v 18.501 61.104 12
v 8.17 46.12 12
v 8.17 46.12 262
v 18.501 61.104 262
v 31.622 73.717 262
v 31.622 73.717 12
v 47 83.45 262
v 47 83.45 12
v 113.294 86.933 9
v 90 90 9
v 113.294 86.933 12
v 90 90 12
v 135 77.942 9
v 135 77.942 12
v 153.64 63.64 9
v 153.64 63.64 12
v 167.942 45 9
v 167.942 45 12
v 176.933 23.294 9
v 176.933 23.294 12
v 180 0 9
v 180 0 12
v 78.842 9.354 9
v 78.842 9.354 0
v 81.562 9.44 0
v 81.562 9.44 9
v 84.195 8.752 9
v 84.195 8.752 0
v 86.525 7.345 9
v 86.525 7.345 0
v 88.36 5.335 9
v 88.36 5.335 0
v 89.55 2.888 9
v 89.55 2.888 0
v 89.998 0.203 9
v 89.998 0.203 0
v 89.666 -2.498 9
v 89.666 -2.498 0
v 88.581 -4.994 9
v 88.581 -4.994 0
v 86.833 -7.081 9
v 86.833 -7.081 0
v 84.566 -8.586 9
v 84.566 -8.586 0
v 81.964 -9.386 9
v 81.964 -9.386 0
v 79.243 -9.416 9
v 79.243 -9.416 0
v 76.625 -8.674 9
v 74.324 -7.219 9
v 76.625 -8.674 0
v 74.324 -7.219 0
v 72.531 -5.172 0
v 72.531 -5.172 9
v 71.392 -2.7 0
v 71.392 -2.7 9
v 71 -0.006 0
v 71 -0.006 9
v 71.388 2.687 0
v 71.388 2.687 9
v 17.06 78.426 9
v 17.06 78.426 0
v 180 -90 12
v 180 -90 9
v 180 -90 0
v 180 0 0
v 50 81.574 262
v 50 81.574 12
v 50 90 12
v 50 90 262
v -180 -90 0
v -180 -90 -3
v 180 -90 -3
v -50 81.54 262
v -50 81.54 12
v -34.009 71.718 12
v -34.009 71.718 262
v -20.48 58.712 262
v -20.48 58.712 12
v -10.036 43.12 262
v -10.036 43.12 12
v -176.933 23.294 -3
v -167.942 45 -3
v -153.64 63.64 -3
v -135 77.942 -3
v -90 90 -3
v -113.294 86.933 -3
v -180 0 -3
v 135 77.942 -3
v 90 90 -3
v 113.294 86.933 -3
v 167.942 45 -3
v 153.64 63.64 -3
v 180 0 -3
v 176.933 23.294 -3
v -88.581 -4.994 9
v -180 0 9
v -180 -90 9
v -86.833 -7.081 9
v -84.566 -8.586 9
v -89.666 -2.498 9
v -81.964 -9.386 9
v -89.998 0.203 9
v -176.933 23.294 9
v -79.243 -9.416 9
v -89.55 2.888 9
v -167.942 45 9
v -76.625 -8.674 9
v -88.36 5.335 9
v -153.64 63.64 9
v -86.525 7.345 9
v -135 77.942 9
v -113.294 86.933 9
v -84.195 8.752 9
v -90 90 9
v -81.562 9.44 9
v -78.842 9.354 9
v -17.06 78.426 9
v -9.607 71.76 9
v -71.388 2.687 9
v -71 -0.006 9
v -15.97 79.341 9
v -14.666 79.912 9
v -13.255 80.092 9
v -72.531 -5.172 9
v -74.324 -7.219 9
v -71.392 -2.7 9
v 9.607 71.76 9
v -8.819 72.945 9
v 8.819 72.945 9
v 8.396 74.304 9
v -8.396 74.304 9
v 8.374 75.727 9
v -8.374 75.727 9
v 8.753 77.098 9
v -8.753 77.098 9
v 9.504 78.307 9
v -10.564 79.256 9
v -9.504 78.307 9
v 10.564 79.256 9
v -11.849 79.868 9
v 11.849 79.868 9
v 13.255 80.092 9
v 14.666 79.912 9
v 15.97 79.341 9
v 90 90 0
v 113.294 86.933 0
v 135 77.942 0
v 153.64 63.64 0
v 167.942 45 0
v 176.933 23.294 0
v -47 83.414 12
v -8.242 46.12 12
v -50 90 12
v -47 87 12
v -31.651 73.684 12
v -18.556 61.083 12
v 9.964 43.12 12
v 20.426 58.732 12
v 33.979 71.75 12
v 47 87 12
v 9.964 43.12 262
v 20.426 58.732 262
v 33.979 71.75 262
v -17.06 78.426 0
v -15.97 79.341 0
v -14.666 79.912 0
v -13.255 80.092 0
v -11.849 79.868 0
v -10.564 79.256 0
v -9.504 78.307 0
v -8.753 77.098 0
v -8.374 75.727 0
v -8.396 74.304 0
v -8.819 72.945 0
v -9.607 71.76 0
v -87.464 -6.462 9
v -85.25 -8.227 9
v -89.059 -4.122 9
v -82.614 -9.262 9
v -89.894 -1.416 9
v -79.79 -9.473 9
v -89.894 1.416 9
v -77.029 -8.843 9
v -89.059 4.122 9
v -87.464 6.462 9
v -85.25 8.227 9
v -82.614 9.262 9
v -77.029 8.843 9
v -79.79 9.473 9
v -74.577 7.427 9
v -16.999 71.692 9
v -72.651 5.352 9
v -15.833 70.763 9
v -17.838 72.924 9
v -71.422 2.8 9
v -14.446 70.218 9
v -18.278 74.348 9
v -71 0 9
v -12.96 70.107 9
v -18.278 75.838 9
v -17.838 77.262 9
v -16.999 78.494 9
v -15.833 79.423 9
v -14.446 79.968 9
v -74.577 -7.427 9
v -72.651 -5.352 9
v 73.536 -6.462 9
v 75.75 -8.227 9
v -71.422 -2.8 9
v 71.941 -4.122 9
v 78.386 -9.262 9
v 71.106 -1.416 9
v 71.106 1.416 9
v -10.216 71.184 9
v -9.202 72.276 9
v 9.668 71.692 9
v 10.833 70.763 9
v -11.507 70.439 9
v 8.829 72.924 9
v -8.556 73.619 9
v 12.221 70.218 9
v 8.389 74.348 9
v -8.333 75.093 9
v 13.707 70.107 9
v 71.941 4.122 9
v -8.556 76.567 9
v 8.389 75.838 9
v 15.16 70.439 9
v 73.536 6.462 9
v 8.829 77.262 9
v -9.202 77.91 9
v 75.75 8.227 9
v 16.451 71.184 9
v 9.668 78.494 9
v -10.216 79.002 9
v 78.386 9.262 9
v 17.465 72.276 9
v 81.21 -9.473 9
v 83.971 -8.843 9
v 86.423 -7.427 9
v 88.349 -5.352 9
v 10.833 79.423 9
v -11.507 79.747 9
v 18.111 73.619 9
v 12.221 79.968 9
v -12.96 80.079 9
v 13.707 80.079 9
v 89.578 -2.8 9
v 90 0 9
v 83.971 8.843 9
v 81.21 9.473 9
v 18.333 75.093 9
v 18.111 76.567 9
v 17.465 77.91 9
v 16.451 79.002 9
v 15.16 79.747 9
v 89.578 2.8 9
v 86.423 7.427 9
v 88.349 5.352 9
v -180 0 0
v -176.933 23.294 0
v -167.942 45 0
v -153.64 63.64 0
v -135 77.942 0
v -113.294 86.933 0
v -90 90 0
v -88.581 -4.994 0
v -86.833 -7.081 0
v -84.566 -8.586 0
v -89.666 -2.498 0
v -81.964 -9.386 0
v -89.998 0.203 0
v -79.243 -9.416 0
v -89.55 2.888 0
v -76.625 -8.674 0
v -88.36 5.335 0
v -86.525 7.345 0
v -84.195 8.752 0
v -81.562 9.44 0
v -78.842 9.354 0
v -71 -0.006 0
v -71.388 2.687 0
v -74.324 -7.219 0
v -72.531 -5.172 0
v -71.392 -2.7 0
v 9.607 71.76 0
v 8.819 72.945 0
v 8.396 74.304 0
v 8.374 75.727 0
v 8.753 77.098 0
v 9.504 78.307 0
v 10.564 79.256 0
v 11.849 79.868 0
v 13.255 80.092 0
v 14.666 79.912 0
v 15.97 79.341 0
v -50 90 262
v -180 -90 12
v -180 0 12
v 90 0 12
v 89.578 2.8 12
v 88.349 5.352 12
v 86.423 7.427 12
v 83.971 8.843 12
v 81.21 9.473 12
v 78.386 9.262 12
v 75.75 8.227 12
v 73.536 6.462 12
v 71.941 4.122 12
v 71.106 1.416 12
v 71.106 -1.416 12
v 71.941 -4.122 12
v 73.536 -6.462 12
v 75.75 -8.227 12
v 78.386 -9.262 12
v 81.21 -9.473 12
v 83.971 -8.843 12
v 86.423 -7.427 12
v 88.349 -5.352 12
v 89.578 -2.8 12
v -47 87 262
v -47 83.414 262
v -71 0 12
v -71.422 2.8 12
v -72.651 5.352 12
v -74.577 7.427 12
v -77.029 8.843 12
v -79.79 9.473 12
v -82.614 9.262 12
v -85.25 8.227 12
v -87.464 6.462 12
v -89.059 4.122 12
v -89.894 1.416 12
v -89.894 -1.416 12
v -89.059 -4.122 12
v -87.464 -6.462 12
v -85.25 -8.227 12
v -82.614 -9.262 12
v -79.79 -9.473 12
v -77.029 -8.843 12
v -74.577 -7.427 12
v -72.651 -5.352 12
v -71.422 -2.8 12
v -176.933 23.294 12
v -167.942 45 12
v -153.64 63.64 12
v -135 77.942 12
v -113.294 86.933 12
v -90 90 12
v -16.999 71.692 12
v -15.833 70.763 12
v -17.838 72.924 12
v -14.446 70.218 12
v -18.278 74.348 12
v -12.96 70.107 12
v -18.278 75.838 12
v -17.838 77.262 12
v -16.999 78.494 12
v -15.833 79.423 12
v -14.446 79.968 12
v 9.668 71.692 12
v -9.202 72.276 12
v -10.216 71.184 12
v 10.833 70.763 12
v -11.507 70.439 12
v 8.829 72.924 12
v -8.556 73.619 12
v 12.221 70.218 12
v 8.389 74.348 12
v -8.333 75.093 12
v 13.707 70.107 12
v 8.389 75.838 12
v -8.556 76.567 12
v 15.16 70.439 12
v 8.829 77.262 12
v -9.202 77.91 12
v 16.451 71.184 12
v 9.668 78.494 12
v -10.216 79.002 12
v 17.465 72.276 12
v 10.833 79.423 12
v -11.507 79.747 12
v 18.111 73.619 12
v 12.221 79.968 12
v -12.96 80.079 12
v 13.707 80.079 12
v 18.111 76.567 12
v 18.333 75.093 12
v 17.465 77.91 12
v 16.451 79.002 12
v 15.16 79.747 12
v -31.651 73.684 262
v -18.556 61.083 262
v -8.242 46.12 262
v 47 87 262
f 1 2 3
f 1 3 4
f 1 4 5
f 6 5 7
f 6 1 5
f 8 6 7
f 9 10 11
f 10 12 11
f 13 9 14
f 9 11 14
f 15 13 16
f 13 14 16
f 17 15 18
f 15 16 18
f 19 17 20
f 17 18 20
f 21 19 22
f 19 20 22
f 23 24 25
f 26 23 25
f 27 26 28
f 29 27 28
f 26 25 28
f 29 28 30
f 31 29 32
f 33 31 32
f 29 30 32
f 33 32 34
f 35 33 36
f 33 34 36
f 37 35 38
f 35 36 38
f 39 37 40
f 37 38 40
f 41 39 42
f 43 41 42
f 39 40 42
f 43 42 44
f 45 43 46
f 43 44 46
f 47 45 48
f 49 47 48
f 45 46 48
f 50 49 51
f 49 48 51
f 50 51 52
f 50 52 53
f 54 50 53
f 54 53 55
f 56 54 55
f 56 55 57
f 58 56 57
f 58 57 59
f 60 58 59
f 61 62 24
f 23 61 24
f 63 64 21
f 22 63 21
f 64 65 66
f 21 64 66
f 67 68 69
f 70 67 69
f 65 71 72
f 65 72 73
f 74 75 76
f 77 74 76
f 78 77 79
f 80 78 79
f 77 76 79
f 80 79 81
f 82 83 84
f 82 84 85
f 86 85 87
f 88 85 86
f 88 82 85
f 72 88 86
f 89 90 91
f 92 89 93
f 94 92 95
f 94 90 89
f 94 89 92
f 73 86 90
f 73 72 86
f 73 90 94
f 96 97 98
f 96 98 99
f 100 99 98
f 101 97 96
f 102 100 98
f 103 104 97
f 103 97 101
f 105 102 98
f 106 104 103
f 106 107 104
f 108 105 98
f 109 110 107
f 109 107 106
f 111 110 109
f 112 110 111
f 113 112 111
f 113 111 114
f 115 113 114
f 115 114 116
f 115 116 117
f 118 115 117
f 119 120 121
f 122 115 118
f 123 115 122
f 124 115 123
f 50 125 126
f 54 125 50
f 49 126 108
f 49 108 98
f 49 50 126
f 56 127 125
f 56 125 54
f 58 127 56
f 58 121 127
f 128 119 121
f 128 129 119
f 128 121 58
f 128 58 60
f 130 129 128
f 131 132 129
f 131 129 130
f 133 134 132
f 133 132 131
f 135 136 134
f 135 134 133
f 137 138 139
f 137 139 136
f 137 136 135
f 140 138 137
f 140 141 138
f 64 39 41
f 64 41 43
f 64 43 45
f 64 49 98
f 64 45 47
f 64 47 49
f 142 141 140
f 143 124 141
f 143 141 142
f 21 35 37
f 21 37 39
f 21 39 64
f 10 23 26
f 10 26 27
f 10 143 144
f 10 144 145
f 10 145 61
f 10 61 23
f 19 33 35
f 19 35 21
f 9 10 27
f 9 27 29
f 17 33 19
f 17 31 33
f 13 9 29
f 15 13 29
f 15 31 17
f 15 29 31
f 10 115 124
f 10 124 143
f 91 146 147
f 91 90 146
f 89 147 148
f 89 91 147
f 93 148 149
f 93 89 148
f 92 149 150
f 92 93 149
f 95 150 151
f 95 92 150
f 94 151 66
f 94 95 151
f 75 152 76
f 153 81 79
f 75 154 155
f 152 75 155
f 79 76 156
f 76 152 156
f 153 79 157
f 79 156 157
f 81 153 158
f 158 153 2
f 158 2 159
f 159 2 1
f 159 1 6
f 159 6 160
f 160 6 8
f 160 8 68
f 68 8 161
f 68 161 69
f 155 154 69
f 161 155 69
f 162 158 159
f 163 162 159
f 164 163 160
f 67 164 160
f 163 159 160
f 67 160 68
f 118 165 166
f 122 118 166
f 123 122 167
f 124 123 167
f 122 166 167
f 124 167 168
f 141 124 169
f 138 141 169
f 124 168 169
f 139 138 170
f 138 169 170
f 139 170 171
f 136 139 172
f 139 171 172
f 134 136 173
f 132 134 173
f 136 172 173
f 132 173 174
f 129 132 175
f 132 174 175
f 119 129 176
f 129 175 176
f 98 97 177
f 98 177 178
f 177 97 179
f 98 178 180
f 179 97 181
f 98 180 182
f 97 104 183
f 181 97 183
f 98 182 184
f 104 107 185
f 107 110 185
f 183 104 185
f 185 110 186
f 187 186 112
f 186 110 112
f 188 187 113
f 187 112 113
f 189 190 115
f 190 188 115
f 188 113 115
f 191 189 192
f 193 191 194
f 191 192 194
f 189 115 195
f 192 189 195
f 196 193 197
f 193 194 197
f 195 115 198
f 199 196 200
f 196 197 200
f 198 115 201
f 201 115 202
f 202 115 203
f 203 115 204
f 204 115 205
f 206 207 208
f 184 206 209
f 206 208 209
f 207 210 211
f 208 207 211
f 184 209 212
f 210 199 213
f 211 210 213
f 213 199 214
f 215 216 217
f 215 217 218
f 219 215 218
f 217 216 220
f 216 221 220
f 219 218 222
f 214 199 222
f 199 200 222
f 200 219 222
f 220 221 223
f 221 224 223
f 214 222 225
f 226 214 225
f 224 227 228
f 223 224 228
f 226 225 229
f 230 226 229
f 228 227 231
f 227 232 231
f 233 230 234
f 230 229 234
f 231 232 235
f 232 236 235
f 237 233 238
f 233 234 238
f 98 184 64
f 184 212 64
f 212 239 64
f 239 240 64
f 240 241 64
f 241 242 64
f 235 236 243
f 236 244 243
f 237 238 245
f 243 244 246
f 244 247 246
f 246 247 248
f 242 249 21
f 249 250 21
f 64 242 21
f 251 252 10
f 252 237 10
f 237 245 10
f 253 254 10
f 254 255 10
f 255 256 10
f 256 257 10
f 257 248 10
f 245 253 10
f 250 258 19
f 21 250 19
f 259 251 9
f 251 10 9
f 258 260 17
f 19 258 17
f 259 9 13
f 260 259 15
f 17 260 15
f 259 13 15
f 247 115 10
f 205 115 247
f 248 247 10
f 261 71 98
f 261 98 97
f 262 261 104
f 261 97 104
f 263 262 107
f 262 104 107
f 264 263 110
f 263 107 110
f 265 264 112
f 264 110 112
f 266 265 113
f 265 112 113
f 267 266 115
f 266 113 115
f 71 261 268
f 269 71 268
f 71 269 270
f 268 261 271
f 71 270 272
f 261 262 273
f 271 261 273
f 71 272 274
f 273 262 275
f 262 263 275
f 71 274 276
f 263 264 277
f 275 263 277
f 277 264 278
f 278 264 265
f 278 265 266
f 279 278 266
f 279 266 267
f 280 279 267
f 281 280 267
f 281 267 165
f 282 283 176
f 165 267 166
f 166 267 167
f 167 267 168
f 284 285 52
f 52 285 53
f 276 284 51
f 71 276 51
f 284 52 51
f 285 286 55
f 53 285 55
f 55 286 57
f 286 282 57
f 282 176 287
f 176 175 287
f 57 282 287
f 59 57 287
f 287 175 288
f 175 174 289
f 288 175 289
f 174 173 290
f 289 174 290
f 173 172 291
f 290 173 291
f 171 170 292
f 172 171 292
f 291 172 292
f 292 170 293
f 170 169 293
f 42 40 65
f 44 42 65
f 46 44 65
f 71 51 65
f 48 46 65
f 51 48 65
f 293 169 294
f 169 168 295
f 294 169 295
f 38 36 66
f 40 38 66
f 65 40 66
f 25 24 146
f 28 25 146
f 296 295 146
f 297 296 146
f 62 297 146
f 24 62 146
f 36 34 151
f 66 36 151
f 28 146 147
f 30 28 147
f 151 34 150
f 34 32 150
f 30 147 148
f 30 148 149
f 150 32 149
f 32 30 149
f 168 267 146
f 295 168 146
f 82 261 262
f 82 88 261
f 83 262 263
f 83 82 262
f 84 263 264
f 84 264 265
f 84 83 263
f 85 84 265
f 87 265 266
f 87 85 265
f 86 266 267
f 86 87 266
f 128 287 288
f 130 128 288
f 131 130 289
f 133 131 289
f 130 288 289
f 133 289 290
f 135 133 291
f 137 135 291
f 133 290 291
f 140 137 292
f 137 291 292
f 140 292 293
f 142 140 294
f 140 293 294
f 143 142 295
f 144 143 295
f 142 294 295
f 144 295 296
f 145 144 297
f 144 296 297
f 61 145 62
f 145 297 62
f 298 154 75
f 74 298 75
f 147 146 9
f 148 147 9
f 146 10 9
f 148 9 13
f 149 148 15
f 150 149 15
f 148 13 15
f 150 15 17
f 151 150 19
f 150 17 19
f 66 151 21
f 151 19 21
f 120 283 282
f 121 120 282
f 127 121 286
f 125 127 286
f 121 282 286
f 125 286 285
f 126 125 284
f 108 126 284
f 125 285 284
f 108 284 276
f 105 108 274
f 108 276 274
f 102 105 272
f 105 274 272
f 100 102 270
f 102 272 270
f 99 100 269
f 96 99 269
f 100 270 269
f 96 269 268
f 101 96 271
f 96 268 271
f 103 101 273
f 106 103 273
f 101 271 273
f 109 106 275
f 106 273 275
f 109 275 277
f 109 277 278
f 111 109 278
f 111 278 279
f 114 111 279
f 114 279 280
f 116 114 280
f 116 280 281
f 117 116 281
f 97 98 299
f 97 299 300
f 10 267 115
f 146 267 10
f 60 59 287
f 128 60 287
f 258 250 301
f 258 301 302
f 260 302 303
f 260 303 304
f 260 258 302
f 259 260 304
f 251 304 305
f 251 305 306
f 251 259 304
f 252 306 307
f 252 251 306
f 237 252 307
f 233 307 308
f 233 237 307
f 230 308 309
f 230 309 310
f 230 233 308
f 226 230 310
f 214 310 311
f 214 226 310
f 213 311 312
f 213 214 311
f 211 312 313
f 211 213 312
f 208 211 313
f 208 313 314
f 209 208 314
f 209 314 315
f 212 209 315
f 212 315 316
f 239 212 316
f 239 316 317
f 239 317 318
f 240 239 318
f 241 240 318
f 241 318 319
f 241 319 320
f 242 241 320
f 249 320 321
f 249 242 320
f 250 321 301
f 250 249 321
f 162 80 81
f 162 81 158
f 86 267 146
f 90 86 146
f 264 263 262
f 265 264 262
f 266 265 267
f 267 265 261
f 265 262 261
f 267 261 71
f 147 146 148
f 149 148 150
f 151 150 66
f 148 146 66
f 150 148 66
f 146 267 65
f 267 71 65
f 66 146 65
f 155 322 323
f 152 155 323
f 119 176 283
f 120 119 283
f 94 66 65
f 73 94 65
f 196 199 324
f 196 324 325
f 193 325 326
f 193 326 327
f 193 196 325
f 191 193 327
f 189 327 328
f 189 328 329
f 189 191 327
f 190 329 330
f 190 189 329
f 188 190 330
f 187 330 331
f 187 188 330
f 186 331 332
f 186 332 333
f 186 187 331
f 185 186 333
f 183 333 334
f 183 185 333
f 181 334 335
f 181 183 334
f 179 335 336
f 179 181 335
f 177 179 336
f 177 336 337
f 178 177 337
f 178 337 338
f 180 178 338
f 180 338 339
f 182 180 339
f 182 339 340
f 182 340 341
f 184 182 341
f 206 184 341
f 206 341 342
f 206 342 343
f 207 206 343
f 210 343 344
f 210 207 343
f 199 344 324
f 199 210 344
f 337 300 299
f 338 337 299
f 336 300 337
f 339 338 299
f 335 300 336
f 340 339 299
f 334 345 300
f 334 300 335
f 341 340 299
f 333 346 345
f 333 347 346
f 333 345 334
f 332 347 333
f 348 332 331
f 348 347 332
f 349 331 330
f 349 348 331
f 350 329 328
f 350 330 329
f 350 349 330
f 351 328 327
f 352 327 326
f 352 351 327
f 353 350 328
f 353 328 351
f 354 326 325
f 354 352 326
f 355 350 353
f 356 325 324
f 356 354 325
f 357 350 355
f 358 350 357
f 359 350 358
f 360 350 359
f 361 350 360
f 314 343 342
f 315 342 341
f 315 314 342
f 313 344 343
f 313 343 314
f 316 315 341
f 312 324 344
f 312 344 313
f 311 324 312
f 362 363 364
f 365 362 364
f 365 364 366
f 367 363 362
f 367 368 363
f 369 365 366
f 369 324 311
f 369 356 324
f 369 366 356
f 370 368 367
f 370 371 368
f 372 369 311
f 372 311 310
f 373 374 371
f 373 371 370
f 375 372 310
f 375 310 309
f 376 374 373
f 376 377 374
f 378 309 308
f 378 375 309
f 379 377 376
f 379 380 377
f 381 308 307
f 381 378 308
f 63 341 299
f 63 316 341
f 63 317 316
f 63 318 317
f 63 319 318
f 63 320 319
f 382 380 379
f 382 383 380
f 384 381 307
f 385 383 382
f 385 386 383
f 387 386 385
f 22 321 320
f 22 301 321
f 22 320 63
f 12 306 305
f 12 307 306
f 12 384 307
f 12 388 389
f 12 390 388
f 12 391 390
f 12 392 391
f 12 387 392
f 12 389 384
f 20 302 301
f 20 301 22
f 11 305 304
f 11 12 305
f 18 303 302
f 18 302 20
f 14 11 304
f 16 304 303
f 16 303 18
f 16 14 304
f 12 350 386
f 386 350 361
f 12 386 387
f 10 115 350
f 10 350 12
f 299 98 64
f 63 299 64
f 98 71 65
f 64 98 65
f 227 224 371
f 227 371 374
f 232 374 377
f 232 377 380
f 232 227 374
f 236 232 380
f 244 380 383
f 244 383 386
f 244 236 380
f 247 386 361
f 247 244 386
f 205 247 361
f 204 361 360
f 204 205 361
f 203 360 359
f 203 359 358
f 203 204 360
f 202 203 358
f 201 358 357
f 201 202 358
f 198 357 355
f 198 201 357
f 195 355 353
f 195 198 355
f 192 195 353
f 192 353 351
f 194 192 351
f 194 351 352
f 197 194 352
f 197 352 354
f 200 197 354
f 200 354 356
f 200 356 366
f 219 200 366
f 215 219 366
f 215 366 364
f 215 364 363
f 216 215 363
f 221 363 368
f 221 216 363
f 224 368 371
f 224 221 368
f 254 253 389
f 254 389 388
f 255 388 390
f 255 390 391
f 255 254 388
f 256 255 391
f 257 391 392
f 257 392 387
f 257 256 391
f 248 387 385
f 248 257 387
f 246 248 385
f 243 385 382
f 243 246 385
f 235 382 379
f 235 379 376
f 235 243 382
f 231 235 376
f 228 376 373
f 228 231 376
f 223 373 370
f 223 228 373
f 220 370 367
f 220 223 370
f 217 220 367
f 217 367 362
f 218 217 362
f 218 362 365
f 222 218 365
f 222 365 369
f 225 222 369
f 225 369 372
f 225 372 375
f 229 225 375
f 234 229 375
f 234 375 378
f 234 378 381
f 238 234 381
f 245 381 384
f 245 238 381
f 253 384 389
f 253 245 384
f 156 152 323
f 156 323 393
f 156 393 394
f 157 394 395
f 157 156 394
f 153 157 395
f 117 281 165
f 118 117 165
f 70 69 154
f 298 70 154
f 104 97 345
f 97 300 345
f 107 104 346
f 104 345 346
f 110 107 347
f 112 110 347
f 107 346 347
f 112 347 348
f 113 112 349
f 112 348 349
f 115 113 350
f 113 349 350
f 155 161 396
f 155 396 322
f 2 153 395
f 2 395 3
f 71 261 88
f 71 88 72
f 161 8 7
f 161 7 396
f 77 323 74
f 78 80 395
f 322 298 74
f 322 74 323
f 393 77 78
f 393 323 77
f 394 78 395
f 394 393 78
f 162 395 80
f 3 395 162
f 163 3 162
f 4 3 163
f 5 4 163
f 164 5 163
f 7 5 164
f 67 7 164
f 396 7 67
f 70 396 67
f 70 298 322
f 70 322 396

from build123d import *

# Parameters (mm, degrees)
F0_W     = 360
F0_H     = 180
F1_DEPTH = 9
F2_W     = 360
F2_H     = 180
F2_R     = 9.5
F2_R_2   = 5
F3_DEPTH = 3
F4_W     = 360
F4_H     = 180
F5_DEPTH = 3
F7_DEPTH = 250
F8_R     = 90
F8_2_R   = 90
F8_3_R   = 90
F9_T     = -3


with BuildPart() as f1:
    # F0 (on Top) → F1 (new body)
    with BuildSketch(Plane.XY):
        Rectangle(F0_W, F0_H)
        with BuildLine():
            ThreePointArc((-71.388029, 2.687377), (-86.833401, -7.080821), (-78.841525, 9.354115))
            Line((-78.841525, 9.354115), (-17.060224, 78.426377))
            ThreePointArc((-17.060224, 78.426377), (-10.000107, 78.819756), (-9.606728, 71.759639))
            Line((-9.606728, 71.759639), (-71.388029, 2.687377))
        make_face(mode=Mode.SUBTRACT)
        with BuildLine():
            Line((71.388029, 2.687377), (9.606728, 71.759639))
            ThreePointArc((9.606728, 71.759639), (10.000107, 78.819756), (17.060224, 78.426377))
            Line((17.060224, 78.426377), (78.841525, 9.354115))
            ThreePointArc((78.841525, 9.354115), (86.833401, -7.080821), (71.388029, 2.687377))
        make_face(mode=Mode.SUBTRACT)
    extrude(amount=F1_DEPTH)

    # F8
    f8_edges = [f1.edges().sort_by_distance(p)[0] for p in [
        (-180, 90, 4.5),
        (180, 90, 4.5),
    ]]
    fillet(f8_edges, radius=F8_R)


with BuildPart() as f3:
    # F2 (on face) → F3 (new body)
    with BuildSketch(Plane.XY.offset(9)):
        Rectangle(F2_W, F2_H)
        with Locations((-80.5, 0)):
            Circle(F2_R, mode=Mode.SUBTRACT)
        with Locations((-13.333476, 75.093008)):
            Circle(F2_R_2, mode=Mode.SUBTRACT)
        with Locations((80.5, 0)):
            Circle(F2_R, mode=Mode.SUBTRACT)
        with Locations((13.333476, 75.093008)):
            Circle(F2_R_2, mode=Mode.SUBTRACT)
    extrude(amount=F3_DEPTH)

    # F8#2
    f8_2_edges = [f3.edges().sort_by_distance(p)[0] for p in [
        (180, 90, 10.5),
        (-180, 90, 10.5),
    ]]
    fillet(f8_2_edges, radius=F8_2_R)


with BuildPart() as f5:
    # F4 (on face) → F5 (new body)
    with BuildSketch(Plane(origin=(0, 0, 0), x_dir=(1, 0, 0), z_dir=(0, 0, -1))):
        Rectangle(F4_W, F4_H)
    extrude(amount=F5_DEPTH)

    # F8#3
    f8_3_edges = [f5.edges().sort_by_distance(p)[0] for p in [
        (180, 90, -1.5),
        (-180, 90, -1.5),
    ]]
    fillet(f8_3_edges, radius=F8_3_R)


with BuildPart() as f7:
    # F6 (on face) → F7 (new body)
    with BuildSketch(Plane.XY.offset(12)):
        with BuildLine():
            Line((50, 90), (-50, 90))
            Line((-50, 90), (-50, 81.539987))
            ThreePointArc((-50, 81.539987), (-26.894774, 65.578725), (-10.035722, 43.120192))
            Line((-10.035722, 43.120192), (9.964278, 43.120192))
            ThreePointArc((9.964278, 43.120192), (26.851839, 65.606119), (50, 81.573876))
            Line((50, 81.573876), (50, 90))
        make_face()
    extrude(amount=F7_DEPTH)

    # F9
    f9_openings = [f7.faces().sort_by_distance(p)[0] for p in [
        (-0.025007, 72.712373, 262),
        (-0.025007, 72.712373, 12),
    ]]
    offset(amount=F9_T, openings=f9_openings)


solid = Compound([f1.part, f3.part, f5.part, f7.part])
